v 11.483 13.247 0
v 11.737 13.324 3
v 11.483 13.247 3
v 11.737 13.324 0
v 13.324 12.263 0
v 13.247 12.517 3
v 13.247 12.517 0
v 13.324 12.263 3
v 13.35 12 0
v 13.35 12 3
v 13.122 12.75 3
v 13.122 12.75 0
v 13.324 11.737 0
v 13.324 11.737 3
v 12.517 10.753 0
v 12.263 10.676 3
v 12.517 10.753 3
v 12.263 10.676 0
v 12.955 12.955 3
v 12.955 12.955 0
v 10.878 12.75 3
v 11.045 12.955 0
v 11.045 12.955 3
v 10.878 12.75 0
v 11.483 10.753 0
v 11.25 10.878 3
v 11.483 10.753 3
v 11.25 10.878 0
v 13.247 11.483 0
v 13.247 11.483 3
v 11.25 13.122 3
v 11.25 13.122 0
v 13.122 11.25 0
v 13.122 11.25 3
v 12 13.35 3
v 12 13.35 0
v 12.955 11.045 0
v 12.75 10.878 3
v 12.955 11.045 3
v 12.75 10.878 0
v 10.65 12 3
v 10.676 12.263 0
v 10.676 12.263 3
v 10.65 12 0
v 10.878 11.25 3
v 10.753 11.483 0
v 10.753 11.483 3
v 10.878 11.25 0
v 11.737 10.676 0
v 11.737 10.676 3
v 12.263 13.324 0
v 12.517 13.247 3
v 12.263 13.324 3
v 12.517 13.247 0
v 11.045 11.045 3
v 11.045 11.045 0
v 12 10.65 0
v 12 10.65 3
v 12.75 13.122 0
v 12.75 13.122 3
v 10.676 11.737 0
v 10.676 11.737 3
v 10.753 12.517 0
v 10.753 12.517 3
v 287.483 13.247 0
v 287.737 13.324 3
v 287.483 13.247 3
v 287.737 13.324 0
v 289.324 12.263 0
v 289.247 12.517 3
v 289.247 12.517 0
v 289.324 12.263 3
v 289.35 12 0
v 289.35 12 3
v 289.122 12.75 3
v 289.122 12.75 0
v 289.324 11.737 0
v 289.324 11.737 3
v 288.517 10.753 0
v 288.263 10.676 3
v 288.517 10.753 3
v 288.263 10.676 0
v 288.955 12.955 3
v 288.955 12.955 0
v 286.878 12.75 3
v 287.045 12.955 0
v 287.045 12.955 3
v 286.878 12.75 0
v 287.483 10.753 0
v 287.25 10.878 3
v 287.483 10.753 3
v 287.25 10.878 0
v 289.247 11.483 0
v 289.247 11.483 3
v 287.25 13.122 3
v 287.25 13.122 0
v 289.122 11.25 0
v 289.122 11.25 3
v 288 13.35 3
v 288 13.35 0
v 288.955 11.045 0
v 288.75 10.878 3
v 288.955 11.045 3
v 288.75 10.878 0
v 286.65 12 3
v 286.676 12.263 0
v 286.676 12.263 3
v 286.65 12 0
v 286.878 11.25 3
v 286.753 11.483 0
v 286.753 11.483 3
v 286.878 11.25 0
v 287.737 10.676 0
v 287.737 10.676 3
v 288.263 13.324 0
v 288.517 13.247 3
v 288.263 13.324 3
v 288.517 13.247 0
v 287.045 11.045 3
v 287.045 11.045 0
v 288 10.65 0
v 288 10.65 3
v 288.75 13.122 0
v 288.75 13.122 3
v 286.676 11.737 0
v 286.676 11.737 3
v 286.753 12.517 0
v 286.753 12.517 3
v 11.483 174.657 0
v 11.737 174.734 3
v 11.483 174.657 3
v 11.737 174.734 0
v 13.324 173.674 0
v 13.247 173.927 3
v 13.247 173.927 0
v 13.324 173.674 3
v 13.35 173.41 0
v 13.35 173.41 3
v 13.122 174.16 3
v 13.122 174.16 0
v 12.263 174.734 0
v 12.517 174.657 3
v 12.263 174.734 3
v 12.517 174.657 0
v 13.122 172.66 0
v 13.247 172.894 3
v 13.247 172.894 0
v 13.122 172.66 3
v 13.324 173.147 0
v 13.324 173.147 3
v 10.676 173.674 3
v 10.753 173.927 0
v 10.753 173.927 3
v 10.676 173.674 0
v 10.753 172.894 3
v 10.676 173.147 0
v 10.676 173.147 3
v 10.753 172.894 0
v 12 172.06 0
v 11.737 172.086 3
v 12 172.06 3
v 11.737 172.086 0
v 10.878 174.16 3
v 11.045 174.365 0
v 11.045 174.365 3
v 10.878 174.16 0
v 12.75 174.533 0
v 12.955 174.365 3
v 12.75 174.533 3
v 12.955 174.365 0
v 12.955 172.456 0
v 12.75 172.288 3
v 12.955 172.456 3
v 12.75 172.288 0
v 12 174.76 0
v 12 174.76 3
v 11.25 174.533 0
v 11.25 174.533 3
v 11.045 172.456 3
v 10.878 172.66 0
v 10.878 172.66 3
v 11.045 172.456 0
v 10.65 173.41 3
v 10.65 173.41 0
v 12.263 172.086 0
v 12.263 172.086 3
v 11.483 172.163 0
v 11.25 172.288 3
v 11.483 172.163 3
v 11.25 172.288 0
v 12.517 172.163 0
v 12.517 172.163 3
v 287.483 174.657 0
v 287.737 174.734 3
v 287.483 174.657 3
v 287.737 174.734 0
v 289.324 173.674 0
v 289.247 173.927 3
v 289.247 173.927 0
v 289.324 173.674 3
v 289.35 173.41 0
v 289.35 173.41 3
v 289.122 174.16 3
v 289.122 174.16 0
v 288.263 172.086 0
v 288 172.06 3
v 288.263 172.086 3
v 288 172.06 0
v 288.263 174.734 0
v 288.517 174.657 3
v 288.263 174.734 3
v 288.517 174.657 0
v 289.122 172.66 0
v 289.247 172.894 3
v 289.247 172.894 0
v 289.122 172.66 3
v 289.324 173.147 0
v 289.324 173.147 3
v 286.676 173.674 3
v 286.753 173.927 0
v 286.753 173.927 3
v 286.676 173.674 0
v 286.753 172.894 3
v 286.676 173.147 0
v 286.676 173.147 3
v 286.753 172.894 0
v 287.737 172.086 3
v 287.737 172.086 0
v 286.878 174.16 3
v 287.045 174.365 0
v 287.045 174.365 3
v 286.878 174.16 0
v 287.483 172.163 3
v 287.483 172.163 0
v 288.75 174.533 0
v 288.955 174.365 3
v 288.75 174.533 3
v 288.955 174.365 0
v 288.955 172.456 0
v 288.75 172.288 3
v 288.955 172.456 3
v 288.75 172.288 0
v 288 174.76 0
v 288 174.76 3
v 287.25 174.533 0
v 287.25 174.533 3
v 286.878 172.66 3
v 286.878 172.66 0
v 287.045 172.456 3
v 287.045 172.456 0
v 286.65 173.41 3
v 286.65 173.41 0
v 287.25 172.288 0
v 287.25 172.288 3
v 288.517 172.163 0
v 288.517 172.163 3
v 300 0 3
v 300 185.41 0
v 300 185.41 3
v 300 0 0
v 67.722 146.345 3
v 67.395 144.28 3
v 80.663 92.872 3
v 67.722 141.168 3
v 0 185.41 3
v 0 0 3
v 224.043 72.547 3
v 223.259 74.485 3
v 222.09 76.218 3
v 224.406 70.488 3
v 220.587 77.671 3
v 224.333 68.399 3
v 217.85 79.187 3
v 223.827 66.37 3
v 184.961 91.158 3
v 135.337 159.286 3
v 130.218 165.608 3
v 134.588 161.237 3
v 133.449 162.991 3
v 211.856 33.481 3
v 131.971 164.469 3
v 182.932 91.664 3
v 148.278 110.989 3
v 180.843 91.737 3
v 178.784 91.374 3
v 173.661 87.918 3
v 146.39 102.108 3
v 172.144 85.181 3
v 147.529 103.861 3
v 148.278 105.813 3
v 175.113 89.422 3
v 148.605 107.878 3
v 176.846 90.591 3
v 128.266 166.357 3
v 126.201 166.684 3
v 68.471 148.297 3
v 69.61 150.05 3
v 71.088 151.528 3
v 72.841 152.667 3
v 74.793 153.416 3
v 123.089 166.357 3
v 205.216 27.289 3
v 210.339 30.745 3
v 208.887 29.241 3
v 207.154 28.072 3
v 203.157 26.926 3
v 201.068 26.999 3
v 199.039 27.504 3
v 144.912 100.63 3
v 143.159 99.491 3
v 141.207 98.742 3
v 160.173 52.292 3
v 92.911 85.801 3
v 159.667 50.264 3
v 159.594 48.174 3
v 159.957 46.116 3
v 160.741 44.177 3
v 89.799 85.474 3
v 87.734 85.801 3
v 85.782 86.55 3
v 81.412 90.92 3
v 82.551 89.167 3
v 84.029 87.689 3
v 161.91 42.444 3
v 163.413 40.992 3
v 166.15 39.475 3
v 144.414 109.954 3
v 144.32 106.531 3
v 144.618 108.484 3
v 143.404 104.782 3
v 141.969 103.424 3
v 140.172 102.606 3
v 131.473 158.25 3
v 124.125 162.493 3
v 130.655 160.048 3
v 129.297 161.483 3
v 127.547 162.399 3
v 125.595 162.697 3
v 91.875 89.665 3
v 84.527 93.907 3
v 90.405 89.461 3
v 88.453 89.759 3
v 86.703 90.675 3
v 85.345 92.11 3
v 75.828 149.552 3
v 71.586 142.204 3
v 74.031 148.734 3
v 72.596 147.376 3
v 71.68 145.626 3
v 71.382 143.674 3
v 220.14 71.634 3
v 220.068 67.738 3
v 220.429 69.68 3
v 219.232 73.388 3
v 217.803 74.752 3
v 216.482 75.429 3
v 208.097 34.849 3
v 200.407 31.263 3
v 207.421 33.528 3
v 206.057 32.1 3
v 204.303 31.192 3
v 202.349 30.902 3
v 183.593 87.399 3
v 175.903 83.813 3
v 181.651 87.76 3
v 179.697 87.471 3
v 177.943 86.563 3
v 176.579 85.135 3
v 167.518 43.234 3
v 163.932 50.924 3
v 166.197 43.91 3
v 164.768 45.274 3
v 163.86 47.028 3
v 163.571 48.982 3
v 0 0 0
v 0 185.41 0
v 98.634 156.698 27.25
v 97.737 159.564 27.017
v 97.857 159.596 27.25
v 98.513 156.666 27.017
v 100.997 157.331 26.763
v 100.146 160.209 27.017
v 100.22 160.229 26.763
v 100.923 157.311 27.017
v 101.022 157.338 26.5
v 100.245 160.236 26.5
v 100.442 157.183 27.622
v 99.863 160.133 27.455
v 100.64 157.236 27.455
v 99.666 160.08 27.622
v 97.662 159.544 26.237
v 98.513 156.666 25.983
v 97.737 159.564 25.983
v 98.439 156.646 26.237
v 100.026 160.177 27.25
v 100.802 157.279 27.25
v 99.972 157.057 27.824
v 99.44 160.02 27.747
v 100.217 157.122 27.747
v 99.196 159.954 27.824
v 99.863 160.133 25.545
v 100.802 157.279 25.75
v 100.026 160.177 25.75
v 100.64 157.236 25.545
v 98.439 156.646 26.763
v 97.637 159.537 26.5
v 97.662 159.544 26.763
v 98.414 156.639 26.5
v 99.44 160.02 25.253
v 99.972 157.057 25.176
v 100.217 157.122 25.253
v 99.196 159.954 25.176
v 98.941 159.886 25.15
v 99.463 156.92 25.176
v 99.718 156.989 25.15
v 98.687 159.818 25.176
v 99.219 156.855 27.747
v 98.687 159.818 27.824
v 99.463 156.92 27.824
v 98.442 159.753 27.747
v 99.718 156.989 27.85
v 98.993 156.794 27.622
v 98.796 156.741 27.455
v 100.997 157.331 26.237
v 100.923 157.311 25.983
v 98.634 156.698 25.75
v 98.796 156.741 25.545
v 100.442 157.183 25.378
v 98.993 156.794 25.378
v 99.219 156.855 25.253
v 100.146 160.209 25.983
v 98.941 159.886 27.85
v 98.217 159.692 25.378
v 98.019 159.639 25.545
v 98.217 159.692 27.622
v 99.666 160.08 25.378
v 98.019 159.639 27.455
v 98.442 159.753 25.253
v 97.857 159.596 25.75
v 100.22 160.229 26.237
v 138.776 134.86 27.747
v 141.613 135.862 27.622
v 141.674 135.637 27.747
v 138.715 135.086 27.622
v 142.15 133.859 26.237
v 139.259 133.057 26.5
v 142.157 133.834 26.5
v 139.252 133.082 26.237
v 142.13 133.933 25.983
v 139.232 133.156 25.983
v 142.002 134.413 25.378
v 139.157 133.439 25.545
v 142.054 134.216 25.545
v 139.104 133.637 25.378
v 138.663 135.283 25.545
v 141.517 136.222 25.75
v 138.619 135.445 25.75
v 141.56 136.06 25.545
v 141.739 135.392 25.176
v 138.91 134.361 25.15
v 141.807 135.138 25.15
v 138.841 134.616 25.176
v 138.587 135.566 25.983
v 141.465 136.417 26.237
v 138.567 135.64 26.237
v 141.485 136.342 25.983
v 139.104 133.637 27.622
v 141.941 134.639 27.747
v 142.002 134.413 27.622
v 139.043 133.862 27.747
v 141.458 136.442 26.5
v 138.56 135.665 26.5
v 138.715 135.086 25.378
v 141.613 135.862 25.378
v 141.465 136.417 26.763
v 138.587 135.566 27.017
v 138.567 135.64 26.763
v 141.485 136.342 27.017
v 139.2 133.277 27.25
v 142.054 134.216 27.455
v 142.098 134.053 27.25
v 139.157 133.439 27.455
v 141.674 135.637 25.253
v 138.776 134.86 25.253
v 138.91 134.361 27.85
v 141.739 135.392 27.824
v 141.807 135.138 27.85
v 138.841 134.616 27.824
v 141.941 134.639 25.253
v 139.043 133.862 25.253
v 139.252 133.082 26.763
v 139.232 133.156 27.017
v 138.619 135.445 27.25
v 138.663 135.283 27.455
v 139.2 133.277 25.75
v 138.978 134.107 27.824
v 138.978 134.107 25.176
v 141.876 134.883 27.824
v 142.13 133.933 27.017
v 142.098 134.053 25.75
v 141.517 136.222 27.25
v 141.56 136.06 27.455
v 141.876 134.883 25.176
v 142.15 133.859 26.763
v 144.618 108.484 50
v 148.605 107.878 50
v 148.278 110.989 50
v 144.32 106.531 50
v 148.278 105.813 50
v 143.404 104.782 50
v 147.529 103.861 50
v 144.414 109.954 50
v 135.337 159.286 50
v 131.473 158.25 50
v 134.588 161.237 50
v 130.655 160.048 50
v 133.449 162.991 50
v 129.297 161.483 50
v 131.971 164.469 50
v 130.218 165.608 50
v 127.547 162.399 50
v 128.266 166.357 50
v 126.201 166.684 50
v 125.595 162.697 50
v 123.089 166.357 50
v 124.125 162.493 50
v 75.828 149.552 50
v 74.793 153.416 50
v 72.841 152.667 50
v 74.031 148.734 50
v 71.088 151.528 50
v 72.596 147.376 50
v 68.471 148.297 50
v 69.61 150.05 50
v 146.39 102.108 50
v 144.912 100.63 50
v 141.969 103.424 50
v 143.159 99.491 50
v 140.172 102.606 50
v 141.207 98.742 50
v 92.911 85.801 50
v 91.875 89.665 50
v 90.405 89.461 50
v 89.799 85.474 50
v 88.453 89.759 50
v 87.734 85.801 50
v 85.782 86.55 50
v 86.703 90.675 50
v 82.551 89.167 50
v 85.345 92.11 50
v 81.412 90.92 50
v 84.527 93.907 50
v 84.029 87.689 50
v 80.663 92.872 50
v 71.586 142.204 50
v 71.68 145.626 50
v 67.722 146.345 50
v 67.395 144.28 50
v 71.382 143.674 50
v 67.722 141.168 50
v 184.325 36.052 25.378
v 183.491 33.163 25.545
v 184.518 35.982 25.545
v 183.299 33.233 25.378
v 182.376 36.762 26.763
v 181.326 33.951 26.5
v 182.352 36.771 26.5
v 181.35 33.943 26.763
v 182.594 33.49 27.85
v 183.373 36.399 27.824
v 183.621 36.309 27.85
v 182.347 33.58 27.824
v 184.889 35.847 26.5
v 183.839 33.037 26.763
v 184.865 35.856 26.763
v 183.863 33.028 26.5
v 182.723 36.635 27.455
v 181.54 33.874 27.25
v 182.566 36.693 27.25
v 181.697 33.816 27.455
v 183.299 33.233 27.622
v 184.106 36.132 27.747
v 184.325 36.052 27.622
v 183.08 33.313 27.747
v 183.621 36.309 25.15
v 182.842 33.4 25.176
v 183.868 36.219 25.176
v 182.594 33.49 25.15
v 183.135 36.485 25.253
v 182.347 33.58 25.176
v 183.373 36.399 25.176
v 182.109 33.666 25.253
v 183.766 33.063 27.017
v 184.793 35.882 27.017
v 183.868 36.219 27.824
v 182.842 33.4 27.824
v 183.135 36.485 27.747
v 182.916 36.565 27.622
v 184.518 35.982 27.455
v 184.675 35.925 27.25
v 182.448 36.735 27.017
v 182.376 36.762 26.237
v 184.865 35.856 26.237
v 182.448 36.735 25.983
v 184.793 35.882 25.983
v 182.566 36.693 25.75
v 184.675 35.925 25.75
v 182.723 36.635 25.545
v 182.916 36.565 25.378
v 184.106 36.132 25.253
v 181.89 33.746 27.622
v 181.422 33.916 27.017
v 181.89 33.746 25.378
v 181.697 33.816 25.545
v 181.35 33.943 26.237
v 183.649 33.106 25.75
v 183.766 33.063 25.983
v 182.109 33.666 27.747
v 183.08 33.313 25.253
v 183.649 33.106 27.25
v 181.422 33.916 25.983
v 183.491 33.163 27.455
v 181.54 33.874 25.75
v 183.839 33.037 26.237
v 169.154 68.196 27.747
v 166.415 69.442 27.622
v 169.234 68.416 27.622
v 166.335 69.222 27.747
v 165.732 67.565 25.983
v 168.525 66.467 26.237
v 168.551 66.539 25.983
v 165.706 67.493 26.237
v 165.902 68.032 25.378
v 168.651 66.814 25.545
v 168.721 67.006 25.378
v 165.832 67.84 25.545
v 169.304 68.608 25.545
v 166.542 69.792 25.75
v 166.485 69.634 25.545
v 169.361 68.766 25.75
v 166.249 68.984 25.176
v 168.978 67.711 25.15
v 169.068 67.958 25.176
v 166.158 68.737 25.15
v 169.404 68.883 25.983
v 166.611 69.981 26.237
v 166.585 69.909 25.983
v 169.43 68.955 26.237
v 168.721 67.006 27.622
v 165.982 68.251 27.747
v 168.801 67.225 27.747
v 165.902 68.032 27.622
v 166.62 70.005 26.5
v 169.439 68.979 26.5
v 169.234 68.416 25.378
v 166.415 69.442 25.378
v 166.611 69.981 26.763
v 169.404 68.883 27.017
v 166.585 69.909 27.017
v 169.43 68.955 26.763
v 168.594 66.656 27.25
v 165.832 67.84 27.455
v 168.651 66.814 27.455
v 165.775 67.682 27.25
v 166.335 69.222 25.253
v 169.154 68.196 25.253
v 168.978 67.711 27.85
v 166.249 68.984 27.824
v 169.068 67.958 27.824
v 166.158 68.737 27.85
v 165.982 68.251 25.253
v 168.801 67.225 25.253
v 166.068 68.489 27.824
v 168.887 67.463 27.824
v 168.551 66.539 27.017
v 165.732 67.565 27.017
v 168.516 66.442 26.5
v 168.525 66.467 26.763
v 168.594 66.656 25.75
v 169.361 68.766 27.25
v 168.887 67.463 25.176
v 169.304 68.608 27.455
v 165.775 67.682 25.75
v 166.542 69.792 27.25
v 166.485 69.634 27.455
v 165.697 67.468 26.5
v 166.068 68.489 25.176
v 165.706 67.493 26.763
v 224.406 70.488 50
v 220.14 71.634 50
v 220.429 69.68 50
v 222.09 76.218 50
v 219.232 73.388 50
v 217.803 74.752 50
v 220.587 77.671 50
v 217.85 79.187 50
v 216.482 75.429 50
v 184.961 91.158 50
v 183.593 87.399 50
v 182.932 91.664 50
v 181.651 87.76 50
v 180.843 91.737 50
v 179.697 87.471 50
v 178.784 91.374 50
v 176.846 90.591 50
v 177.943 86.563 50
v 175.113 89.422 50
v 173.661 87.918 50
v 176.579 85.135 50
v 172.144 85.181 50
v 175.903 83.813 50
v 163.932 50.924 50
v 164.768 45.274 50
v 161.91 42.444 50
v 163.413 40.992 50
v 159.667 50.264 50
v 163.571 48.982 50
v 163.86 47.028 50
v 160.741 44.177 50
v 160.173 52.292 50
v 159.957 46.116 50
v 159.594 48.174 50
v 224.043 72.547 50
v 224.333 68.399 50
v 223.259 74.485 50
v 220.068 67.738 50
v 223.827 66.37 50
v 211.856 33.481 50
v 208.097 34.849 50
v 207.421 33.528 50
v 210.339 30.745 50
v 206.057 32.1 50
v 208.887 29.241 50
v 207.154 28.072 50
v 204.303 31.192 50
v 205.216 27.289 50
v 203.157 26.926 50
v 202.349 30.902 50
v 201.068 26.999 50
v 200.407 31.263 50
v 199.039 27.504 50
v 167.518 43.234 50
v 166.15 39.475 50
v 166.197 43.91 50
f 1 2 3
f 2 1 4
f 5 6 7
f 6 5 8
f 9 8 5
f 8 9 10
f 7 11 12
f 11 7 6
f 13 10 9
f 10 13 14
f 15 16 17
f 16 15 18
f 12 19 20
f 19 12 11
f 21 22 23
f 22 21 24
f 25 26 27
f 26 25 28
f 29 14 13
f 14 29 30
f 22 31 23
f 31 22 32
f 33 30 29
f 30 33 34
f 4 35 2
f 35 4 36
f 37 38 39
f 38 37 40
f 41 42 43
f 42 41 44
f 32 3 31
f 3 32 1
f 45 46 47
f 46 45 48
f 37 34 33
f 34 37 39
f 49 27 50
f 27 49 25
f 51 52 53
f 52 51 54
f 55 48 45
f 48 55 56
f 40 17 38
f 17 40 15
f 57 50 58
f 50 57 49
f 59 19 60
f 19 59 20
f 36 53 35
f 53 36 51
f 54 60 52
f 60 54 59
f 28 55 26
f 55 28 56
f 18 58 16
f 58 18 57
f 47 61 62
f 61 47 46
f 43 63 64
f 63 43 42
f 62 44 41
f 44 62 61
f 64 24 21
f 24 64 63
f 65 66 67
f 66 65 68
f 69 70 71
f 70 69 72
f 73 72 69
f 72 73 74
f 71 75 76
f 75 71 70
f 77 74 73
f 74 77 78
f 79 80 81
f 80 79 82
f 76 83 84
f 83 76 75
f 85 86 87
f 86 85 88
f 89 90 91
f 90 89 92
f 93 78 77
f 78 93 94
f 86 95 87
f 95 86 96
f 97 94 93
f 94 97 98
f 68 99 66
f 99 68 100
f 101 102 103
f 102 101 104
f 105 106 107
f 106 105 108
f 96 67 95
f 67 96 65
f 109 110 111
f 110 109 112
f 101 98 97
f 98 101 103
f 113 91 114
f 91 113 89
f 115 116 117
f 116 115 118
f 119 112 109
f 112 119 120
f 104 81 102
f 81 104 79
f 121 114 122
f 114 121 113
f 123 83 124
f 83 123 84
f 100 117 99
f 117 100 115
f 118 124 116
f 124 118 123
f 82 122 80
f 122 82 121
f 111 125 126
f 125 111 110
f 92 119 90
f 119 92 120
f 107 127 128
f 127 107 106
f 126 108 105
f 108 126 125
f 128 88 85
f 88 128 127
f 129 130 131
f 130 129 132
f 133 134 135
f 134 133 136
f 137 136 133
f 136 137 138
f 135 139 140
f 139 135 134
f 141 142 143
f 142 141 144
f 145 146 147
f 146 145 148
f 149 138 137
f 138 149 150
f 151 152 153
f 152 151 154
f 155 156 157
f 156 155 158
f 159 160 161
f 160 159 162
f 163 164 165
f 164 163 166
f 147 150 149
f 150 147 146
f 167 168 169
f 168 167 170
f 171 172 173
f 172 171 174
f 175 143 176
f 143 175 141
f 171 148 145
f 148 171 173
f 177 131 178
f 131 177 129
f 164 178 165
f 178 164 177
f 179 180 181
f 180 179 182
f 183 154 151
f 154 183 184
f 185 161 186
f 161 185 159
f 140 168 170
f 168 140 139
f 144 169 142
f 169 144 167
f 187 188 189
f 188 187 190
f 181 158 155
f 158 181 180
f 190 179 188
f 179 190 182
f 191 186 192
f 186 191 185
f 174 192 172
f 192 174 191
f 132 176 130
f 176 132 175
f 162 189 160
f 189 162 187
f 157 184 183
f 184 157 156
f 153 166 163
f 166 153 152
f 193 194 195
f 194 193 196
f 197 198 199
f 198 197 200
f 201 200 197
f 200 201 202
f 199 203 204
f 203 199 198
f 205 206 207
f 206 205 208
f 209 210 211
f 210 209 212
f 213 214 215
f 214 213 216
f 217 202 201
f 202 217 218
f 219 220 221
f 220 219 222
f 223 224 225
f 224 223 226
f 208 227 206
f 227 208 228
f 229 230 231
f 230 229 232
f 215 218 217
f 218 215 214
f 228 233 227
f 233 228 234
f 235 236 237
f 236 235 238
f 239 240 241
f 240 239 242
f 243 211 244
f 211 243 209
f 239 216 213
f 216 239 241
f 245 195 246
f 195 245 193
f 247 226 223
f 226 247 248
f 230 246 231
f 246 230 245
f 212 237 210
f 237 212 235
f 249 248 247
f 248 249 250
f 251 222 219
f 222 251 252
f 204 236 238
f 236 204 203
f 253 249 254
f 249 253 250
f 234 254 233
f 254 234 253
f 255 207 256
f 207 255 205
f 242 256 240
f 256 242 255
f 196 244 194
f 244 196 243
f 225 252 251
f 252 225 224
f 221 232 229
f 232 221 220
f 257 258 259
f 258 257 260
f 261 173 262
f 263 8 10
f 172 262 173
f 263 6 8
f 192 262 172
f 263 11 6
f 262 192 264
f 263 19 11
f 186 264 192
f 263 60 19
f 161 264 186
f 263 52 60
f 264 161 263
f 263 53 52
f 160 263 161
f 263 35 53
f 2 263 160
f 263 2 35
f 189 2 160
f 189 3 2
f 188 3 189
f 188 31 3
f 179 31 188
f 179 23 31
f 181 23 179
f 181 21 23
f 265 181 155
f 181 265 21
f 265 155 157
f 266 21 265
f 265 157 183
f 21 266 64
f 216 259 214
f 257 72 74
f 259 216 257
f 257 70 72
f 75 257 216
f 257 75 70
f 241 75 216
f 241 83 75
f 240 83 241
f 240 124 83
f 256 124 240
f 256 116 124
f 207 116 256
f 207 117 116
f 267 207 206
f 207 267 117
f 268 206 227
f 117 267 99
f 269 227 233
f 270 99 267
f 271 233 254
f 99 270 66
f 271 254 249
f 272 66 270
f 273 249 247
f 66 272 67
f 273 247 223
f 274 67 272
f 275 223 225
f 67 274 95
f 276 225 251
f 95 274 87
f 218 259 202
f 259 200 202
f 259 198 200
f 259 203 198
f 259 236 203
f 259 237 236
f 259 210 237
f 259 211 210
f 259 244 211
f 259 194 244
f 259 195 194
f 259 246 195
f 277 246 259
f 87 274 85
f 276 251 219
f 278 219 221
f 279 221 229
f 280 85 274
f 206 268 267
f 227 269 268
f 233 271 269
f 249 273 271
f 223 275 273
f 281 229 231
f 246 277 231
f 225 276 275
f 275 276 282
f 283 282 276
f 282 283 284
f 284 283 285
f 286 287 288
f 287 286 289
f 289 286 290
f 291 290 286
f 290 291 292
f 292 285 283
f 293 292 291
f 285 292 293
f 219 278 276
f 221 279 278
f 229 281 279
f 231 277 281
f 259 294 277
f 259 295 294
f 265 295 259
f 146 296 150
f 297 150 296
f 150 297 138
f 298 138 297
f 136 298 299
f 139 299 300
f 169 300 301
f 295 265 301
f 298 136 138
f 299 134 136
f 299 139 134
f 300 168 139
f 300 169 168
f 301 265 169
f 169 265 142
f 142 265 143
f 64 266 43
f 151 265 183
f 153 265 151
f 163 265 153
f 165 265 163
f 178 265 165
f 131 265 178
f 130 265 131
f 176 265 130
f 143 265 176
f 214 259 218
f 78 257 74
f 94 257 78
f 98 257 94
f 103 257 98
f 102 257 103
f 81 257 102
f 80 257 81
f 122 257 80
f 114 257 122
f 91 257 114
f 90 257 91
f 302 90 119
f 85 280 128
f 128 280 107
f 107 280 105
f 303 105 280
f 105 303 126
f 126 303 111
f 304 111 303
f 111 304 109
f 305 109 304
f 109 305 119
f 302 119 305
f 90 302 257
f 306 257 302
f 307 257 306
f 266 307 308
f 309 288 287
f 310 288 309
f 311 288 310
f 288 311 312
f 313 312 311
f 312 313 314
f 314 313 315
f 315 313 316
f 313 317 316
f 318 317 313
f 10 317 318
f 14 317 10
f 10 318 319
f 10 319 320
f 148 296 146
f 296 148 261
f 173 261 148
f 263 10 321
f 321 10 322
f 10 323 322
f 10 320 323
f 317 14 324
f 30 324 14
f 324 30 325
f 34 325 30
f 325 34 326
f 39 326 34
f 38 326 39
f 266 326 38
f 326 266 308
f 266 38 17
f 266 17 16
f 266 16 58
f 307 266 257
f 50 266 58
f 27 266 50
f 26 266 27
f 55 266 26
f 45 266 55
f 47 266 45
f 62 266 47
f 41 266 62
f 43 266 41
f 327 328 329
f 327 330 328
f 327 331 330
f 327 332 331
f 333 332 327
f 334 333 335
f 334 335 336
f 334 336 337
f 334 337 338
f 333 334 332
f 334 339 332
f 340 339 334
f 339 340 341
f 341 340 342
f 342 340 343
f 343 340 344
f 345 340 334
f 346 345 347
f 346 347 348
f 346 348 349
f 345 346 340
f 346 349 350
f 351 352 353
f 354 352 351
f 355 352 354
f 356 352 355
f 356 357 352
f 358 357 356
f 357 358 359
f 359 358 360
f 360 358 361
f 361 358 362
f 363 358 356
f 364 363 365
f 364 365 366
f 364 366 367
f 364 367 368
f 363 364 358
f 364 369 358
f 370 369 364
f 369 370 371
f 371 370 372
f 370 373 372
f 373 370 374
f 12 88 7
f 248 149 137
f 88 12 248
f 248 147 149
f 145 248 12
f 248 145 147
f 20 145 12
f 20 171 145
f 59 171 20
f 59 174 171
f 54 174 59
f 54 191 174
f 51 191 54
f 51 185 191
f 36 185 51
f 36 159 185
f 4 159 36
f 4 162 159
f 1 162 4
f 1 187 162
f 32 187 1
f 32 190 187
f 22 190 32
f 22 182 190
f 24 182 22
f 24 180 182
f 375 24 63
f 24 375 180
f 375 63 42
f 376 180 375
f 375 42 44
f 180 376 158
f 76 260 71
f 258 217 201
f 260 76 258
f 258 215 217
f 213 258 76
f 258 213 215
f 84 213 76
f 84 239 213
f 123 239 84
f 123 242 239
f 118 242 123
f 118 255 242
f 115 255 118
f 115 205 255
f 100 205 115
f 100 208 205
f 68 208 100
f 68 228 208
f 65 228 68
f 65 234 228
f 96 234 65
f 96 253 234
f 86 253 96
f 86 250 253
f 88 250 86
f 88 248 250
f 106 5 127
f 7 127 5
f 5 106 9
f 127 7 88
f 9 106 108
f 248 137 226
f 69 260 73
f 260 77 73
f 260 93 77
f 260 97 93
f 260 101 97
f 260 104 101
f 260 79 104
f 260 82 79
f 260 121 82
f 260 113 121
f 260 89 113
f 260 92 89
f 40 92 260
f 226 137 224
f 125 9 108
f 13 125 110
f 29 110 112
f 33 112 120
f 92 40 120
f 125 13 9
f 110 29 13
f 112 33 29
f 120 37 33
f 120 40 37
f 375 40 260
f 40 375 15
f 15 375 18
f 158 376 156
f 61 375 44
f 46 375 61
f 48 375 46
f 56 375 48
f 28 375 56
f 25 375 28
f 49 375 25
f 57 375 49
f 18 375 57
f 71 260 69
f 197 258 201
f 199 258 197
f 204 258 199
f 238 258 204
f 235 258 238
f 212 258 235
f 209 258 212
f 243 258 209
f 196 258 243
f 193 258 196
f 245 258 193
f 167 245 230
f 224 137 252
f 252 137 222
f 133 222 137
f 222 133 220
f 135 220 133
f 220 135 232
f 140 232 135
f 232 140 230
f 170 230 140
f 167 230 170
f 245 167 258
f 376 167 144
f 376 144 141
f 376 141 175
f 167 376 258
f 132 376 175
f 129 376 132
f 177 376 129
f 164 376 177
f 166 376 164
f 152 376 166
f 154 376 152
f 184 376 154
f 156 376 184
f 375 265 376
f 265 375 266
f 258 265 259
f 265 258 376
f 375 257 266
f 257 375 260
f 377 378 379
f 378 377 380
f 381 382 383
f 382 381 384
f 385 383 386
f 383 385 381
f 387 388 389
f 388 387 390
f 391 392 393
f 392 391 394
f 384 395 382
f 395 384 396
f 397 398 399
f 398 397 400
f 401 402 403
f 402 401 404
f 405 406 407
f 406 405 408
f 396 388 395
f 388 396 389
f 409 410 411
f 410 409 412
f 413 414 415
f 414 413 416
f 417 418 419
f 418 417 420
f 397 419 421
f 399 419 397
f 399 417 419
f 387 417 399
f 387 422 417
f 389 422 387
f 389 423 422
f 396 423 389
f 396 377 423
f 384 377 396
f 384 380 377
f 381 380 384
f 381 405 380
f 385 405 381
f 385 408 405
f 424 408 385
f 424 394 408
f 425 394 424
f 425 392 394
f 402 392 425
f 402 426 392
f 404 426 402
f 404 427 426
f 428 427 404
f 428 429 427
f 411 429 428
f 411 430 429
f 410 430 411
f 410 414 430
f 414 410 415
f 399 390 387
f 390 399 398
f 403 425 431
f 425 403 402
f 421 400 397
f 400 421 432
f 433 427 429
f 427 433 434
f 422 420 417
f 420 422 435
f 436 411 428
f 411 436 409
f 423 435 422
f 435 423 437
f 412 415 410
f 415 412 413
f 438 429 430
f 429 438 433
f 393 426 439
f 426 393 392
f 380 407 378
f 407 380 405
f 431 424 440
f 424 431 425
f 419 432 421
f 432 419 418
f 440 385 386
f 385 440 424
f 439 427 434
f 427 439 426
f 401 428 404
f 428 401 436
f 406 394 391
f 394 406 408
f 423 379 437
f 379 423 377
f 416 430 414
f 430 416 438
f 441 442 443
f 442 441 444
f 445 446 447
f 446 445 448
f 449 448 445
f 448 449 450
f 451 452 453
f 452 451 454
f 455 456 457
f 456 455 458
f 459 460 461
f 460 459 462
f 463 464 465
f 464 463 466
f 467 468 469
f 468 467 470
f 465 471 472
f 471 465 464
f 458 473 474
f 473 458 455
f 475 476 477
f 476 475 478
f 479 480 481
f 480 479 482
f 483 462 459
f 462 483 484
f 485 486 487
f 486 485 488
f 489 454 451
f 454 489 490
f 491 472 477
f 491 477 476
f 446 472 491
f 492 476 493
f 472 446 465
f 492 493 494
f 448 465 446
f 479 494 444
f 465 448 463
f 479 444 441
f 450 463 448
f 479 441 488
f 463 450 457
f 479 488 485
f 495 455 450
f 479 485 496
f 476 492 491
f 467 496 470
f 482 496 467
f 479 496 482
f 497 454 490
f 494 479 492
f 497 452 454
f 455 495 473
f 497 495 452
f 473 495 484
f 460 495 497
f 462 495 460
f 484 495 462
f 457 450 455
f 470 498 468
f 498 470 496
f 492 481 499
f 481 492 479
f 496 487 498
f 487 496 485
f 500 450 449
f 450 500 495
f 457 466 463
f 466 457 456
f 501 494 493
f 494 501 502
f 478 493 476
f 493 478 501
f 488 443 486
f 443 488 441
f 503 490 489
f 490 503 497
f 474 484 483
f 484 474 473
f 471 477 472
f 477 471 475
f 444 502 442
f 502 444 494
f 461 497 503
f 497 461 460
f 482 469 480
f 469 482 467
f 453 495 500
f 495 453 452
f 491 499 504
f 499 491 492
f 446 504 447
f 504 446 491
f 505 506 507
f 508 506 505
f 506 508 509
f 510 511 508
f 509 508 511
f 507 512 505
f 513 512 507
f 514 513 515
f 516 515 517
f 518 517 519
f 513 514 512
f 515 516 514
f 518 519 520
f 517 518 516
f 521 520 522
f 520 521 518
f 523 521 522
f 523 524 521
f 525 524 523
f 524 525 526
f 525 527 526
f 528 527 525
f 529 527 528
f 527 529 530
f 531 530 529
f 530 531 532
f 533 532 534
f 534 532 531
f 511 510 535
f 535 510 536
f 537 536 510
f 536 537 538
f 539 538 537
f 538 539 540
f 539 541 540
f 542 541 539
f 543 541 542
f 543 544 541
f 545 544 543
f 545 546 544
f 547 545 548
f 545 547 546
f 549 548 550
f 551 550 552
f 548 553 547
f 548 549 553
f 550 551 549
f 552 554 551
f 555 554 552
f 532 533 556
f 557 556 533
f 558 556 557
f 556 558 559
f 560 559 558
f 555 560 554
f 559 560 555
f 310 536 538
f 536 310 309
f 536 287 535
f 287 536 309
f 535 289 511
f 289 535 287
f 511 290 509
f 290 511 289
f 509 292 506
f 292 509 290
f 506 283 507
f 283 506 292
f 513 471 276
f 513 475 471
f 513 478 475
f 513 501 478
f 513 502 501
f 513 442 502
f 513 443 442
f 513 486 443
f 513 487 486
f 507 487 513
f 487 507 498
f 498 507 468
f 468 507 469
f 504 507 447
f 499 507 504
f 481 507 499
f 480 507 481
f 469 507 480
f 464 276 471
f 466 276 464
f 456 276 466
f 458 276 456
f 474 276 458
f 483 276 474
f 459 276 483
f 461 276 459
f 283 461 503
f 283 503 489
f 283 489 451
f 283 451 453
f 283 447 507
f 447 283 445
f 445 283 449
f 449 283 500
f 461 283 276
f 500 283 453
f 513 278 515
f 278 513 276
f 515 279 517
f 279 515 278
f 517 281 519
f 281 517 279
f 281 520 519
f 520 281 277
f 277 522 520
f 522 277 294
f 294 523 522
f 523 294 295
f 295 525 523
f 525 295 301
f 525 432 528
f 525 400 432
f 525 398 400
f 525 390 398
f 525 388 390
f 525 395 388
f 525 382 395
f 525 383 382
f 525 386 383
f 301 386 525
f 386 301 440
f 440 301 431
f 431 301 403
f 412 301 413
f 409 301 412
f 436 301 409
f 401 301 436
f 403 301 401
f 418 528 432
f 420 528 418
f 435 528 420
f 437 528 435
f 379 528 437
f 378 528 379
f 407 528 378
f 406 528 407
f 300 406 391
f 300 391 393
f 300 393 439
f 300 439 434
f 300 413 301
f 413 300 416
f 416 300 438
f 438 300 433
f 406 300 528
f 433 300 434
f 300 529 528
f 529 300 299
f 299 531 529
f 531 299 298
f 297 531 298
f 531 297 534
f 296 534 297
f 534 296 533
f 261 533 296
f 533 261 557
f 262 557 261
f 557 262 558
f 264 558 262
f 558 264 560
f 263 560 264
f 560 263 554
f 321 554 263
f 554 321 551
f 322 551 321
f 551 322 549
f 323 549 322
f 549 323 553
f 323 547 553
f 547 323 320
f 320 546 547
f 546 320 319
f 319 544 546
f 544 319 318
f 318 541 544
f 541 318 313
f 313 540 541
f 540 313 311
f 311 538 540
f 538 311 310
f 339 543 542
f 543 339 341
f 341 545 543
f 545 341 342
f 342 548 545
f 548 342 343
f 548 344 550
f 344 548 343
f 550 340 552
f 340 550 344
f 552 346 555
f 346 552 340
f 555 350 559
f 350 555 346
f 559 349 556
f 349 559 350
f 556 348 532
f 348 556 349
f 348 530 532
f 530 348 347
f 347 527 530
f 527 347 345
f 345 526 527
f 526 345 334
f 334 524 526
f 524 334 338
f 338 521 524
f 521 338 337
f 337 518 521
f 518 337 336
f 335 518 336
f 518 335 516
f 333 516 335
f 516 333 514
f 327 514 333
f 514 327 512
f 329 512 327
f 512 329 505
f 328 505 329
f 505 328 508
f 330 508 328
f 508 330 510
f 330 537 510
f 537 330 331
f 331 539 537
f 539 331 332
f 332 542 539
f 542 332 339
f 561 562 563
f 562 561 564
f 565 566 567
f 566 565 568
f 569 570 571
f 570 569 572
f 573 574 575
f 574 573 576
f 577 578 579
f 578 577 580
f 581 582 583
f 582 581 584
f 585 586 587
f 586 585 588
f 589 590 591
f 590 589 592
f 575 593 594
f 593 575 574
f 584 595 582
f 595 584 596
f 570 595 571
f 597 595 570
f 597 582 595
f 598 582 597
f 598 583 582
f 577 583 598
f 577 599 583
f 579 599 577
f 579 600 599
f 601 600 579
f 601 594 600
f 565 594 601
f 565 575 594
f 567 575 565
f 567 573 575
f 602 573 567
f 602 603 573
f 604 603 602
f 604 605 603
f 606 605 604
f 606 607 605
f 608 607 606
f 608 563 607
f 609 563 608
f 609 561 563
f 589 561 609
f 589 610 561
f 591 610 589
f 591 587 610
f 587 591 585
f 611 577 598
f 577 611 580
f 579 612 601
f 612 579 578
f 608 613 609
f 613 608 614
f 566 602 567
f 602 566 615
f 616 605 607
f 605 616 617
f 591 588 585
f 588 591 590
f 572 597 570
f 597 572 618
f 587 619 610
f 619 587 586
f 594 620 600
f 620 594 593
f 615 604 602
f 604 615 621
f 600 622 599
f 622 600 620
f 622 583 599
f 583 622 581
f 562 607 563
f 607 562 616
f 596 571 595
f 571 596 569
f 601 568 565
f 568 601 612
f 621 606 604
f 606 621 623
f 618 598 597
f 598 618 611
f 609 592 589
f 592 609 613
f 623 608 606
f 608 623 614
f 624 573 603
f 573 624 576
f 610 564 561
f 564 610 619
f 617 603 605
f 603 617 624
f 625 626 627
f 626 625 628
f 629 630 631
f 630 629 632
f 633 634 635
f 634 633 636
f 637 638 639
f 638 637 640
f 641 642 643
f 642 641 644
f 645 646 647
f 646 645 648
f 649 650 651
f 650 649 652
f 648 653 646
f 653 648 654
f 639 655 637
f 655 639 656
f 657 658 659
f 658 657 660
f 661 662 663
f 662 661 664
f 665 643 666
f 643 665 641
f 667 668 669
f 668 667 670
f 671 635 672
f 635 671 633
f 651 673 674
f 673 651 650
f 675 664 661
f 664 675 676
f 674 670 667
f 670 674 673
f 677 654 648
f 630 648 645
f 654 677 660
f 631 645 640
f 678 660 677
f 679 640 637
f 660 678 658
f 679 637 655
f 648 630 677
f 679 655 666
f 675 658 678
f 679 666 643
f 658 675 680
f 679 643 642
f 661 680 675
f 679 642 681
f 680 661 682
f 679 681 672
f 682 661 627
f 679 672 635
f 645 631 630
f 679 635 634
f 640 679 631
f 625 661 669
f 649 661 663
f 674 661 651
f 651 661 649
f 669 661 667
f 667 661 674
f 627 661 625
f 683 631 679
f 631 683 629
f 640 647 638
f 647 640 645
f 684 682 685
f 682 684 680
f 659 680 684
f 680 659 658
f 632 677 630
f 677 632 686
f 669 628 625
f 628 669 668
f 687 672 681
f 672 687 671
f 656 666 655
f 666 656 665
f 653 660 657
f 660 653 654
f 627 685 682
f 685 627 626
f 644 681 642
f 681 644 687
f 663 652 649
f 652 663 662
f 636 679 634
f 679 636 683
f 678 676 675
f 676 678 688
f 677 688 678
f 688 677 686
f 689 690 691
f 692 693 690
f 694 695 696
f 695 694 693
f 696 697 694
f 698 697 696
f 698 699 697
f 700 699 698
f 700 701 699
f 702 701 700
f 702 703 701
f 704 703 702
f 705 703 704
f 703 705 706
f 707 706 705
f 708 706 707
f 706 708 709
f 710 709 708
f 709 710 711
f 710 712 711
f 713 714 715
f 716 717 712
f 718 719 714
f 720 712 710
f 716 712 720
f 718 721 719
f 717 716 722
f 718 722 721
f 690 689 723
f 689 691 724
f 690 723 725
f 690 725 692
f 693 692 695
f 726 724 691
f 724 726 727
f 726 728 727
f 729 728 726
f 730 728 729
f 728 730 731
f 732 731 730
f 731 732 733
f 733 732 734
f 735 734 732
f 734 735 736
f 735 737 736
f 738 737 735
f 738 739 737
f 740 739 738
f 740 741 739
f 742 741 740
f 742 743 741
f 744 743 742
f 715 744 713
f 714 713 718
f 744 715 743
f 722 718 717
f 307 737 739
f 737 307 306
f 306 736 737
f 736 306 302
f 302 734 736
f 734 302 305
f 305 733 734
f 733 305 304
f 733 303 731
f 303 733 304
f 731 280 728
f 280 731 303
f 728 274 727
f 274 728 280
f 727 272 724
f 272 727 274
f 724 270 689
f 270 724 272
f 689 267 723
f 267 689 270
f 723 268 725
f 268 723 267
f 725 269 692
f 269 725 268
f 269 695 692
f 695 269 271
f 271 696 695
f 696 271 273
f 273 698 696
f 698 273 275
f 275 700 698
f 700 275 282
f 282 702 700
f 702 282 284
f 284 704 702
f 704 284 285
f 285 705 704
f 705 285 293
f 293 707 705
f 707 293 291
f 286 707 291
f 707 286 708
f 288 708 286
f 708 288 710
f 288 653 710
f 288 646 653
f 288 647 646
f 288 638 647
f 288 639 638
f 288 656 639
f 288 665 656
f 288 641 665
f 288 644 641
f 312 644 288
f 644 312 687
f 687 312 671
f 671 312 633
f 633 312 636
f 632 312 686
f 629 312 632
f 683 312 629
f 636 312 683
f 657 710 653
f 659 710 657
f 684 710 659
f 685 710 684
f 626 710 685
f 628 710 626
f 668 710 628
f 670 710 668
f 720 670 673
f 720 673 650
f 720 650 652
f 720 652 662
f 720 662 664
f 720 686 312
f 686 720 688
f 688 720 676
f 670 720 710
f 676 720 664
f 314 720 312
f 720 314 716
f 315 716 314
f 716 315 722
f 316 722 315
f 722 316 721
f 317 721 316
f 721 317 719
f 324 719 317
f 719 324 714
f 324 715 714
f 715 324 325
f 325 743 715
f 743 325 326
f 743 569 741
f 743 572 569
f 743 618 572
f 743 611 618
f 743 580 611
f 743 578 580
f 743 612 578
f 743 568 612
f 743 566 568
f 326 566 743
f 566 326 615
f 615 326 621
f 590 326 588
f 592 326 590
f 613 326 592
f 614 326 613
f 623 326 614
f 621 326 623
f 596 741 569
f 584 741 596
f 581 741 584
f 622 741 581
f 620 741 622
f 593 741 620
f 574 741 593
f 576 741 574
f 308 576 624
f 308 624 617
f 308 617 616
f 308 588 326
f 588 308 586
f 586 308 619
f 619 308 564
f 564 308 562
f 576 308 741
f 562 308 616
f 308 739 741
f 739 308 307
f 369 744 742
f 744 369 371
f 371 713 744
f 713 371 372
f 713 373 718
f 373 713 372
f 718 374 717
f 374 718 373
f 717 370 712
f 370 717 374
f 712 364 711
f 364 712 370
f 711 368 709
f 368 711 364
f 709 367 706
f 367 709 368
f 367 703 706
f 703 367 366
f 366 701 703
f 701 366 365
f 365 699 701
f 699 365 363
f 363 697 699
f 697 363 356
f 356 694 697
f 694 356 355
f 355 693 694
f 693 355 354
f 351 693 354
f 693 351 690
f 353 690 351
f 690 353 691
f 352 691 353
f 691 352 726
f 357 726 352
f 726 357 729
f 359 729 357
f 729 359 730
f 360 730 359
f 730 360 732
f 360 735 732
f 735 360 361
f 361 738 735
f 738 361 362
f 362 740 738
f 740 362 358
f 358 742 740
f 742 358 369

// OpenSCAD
// LED Chamber Lightbox Design
// Box with internal compartments for LED diffusion

// === DESIGN SELECTOR ===
design = 2;  // 1 = angular dividers, 2 = falling rounded squares

// === PARAMETERS ===
// Golden ratio throughout
phi = 1.618033988749;   // Golden ratio

// Overall dimensions (golden ratio rectangle)
box_width = 300;        // Total width (X) - longer side
box_depth = box_width / phi;  // Total depth (Y) ~185.4 - shorter side
box_height = 50;        // Wall height (Z)

// Wall parameters
wall_thickness = 4;     // Wall thickness
floor_thickness = 3;    // Bottom floor thickness

// Mounting holes
mount_hole_diameter = 2.7;  // M2.5 holes with clearance
mount_hole_inset = 12;      // Distance from edges
wiring_hole_diameter = 2.7; // M2.5 wiring holes with clearance

// Layout parameters
inset_percent = 0.20;   // 20% inset from edges for inner compartment

// === GOLDEN RATIO CALCULATED VALUES ===
// Inner compartment is also a golden rectangle
inner_width = box_width * (1 - 2 * inset_percent);  // 60% of outer width
inner_depth = inner_width / phi;                     // Golden ratio proportions

// Corner radius derived from smaller dimension
corner_radius = inner_depth / (phi * 6);  // ~6mm, proportional

// Divider at golden ratio position (61.8% from bottom)
divider_y_ratio = 1 / phi;  // ~0.618

// Gap is golden ratio proportion of divider length (doubled)
divider_gap = inner_width / (phi * 3) * 2;  // ~62mm

// === MODULES ===

// Module for mounting holes
module mounting_holes() {
    // Bottom-left
    translate([mount_hole_inset, mount_hole_inset, -1])
        cylinder(h = floor_thickness + 2, d = mount_hole_diameter, $fn = 32);
    // Bottom-right
    translate([box_width - mount_hole_inset, mount_hole_inset, -1])
        cylinder(h = floor_thickness + 2, d = mount_hole_diameter, $fn = 32);
    // Top-left
    translate([mount_hole_inset, box_depth - mount_hole_inset, -1])
        cylinder(h = floor_thickness + 2, d = mount_hole_diameter, $fn = 32);
    // Top-right
    translate([box_width - mount_hole_inset, box_depth - mount_hole_inset, -1])
        cylinder(h = floor_thickness + 2, d = mount_hole_diameter, $fn = 32);
}

module chamber_lightbox() {
    difference() {
        // Backplate only (no outer walls)
        cube([box_width, box_depth, floor_thickness]);
        mounting_holes();
    }

    // Gap size for light leaks
    gap = 30;
    h_y = box_depth * 0.40;
    v_x = box_width * 0.60;
    v2_x = box_width * 0.25;

    // Horizontal divider (40% from bottom) - gap on right, with wiring holes
    difference() {
        translate([0, h_y - wall_thickness/2, floor_thickness])
            cube([box_width * 0.7, wall_thickness, box_height - floor_thickness]);
        // Wiring holes in horizontal divider
        translate([box_width * 0.15, h_y, floor_thickness + (box_height - floor_thickness)/2])
            rotate([90, 0, 0])
            cylinder(h = wall_thickness + 2, d = wiring_hole_diameter, center = true, $fn = 32);
        translate([box_width * 0.45, h_y, floor_thickness + (box_height - floor_thickness)/2])
            rotate([90, 0, 0])
            cylinder(h = wall_thickness + 2, d = wiring_hole_diameter, center = true, $fn = 32);
    }

    // Vertical divider (60% from left) - gap at bottom, with wiring hole
    difference() {
        translate([v_x - wall_thickness/2, h_y + gap, floor_thickness])
            cube([wall_thickness, box_depth - h_y - gap, box_height - floor_thickness]);
        // Wiring hole
        translate([v_x, box_depth * 0.75, floor_thickness + (box_height - floor_thickness)/2])
            rotate([0, 90, 0])
            cylinder(h = wall_thickness + 2, d = wiring_hole_diameter, center = true, $fn = 32);
    }

    // Second vertical divider (25% from left) - bottom section, gap at top, with wiring hole
    difference() {
        translate([v2_x - wall_thickness/2, 0, floor_thickness])
            cube([wall_thickness, h_y - gap, box_height - floor_thickness]);
        // Wiring hole
        translate([v2_x, box_depth * 0.15, floor_thickness + (box_height - floor_thickness)/2])
            rotate([0, 90, 0])
            cylinder(h = wall_thickness + 2, d = wiring_hole_diameter, center = true, $fn = 32);
    }
}

// === DESIGN 2: Falling rounded squares ===
module falling_squares() {
    difference() {
        // Backplate only (no outer walls)
        cube([box_width, box_depth, floor_thickness]);
        mounting_holes();
    }

    // Rounded square parameters
    sq1_size = 70;
    sq2_size = 55;
    corner_r = 10;
    sq_wall = 4;  // Wall thickness for hollow squares
    sq1_x = box_width * 0.36;
    sq1_y = box_depth * 0.68;
    sq2_x = box_width * 0.64;
    sq2_y = box_depth * 0.32;

    // First rounded square - larger, tilted 15 degrees, upper left area (hollow)
    difference() {
        translate([sq1_x, sq1_y, floor_thickness])
            rotate([0, 0, 15])
            linear_extrude(box_height - floor_thickness)
            difference() {
                offset(r = corner_r)
                offset(delta = -corner_r)
                square([sq1_size, sq1_size], center = true);

                offset(r = corner_r - sq_wall)
                offset(delta = -(corner_r - sq_wall))
                square([sq1_size - 2*sq_wall, sq1_size - 2*sq_wall], center = true);
            }
        // Wiring holes on each side of square 1
        translate([sq1_x, sq1_y, floor_thickness + (box_height - floor_thickness)/2])
            rotate([0, 0, 15]) {
                // Top side
                translate([0, sq1_size/2, 0])
                    rotate([90, 0, 0])
                    cylinder(h = sq_wall + 2, d = wiring_hole_diameter, center = true, $fn = 32);
                // Right side
                translate([sq1_size/2, 0, 0])
                    rotate([0, 90, 0])
                    cylinder(h = sq_wall + 2, d = wiring_hole_diameter, center = true, $fn = 32);
            }
    }

    // Second rounded square - smaller, tilted -20 degrees, lower right area (hollow)
    difference() {
        translate([sq2_x, sq2_y, floor_thickness])
            rotate([0, 0, -20])
            linear_extrude(box_height - floor_thickness)
            difference() {
                offset(r = corner_r)
                offset(delta = -corner_r)
                square([sq2_size, sq2_size], center = true);

                offset(r = corner_r - sq_wall)
                offset(delta = -(corner_r - sq_wall))
                square([sq2_size - 2*sq_wall, sq2_size - 2*sq_wall], center = true);
            }
        // Wiring holes on each side of square 2
        translate([sq2_x, sq2_y, floor_thickness + (box_height - floor_thickness)/2])
            rotate([0, 0, -20]) {
                // Bottom side
                translate([0, -sq2_size/2, 0])
                    rotate([90, 0, 0])
                    cylinder(h = sq_wall + 2, d = wiring_hole_diameter, center = true, $fn = 32);
                // Left side
                translate([-sq2_size/2, 0, 0])
                    rotate([0, 90, 0])
                    cylinder(h = sq_wall + 2, d = wiring_hole_diameter, center = true, $fn = 32);
            }
    }
}

// Render based on design selection
if (design == 1) {
    chamber_lightbox();
} else if (design == 2) {
    falling_squares();
}

// === LAYOUT (top-down view) ===
//
//  +---------------------------------------+
//  |                                       |
//  |     (----------------------------)    |
//  |     (                            )    |
//  |     (      CHAMBER A (small)     )    |
//  |     (-------[  gap  ]------------)    |
//  |     (                            )    |
//  |     (                            )    |
//  |     (      CHAMBER B (large)     )    |
//  |     (                            )    |
//  |     (----------------------------)    |
//  |                                       |
//  +---------------------------------------+
//
// Golden ratio applied to:
// - Outer box proportions (width:depth = phi)
// - Box height (depth:height = phi)
// - Inner compartment proportions (golden rectangle)
// - Divider position (61.8% from bottom)
// - Gap size (proportional to phi)
// - Corner radius (proportional to phi)
